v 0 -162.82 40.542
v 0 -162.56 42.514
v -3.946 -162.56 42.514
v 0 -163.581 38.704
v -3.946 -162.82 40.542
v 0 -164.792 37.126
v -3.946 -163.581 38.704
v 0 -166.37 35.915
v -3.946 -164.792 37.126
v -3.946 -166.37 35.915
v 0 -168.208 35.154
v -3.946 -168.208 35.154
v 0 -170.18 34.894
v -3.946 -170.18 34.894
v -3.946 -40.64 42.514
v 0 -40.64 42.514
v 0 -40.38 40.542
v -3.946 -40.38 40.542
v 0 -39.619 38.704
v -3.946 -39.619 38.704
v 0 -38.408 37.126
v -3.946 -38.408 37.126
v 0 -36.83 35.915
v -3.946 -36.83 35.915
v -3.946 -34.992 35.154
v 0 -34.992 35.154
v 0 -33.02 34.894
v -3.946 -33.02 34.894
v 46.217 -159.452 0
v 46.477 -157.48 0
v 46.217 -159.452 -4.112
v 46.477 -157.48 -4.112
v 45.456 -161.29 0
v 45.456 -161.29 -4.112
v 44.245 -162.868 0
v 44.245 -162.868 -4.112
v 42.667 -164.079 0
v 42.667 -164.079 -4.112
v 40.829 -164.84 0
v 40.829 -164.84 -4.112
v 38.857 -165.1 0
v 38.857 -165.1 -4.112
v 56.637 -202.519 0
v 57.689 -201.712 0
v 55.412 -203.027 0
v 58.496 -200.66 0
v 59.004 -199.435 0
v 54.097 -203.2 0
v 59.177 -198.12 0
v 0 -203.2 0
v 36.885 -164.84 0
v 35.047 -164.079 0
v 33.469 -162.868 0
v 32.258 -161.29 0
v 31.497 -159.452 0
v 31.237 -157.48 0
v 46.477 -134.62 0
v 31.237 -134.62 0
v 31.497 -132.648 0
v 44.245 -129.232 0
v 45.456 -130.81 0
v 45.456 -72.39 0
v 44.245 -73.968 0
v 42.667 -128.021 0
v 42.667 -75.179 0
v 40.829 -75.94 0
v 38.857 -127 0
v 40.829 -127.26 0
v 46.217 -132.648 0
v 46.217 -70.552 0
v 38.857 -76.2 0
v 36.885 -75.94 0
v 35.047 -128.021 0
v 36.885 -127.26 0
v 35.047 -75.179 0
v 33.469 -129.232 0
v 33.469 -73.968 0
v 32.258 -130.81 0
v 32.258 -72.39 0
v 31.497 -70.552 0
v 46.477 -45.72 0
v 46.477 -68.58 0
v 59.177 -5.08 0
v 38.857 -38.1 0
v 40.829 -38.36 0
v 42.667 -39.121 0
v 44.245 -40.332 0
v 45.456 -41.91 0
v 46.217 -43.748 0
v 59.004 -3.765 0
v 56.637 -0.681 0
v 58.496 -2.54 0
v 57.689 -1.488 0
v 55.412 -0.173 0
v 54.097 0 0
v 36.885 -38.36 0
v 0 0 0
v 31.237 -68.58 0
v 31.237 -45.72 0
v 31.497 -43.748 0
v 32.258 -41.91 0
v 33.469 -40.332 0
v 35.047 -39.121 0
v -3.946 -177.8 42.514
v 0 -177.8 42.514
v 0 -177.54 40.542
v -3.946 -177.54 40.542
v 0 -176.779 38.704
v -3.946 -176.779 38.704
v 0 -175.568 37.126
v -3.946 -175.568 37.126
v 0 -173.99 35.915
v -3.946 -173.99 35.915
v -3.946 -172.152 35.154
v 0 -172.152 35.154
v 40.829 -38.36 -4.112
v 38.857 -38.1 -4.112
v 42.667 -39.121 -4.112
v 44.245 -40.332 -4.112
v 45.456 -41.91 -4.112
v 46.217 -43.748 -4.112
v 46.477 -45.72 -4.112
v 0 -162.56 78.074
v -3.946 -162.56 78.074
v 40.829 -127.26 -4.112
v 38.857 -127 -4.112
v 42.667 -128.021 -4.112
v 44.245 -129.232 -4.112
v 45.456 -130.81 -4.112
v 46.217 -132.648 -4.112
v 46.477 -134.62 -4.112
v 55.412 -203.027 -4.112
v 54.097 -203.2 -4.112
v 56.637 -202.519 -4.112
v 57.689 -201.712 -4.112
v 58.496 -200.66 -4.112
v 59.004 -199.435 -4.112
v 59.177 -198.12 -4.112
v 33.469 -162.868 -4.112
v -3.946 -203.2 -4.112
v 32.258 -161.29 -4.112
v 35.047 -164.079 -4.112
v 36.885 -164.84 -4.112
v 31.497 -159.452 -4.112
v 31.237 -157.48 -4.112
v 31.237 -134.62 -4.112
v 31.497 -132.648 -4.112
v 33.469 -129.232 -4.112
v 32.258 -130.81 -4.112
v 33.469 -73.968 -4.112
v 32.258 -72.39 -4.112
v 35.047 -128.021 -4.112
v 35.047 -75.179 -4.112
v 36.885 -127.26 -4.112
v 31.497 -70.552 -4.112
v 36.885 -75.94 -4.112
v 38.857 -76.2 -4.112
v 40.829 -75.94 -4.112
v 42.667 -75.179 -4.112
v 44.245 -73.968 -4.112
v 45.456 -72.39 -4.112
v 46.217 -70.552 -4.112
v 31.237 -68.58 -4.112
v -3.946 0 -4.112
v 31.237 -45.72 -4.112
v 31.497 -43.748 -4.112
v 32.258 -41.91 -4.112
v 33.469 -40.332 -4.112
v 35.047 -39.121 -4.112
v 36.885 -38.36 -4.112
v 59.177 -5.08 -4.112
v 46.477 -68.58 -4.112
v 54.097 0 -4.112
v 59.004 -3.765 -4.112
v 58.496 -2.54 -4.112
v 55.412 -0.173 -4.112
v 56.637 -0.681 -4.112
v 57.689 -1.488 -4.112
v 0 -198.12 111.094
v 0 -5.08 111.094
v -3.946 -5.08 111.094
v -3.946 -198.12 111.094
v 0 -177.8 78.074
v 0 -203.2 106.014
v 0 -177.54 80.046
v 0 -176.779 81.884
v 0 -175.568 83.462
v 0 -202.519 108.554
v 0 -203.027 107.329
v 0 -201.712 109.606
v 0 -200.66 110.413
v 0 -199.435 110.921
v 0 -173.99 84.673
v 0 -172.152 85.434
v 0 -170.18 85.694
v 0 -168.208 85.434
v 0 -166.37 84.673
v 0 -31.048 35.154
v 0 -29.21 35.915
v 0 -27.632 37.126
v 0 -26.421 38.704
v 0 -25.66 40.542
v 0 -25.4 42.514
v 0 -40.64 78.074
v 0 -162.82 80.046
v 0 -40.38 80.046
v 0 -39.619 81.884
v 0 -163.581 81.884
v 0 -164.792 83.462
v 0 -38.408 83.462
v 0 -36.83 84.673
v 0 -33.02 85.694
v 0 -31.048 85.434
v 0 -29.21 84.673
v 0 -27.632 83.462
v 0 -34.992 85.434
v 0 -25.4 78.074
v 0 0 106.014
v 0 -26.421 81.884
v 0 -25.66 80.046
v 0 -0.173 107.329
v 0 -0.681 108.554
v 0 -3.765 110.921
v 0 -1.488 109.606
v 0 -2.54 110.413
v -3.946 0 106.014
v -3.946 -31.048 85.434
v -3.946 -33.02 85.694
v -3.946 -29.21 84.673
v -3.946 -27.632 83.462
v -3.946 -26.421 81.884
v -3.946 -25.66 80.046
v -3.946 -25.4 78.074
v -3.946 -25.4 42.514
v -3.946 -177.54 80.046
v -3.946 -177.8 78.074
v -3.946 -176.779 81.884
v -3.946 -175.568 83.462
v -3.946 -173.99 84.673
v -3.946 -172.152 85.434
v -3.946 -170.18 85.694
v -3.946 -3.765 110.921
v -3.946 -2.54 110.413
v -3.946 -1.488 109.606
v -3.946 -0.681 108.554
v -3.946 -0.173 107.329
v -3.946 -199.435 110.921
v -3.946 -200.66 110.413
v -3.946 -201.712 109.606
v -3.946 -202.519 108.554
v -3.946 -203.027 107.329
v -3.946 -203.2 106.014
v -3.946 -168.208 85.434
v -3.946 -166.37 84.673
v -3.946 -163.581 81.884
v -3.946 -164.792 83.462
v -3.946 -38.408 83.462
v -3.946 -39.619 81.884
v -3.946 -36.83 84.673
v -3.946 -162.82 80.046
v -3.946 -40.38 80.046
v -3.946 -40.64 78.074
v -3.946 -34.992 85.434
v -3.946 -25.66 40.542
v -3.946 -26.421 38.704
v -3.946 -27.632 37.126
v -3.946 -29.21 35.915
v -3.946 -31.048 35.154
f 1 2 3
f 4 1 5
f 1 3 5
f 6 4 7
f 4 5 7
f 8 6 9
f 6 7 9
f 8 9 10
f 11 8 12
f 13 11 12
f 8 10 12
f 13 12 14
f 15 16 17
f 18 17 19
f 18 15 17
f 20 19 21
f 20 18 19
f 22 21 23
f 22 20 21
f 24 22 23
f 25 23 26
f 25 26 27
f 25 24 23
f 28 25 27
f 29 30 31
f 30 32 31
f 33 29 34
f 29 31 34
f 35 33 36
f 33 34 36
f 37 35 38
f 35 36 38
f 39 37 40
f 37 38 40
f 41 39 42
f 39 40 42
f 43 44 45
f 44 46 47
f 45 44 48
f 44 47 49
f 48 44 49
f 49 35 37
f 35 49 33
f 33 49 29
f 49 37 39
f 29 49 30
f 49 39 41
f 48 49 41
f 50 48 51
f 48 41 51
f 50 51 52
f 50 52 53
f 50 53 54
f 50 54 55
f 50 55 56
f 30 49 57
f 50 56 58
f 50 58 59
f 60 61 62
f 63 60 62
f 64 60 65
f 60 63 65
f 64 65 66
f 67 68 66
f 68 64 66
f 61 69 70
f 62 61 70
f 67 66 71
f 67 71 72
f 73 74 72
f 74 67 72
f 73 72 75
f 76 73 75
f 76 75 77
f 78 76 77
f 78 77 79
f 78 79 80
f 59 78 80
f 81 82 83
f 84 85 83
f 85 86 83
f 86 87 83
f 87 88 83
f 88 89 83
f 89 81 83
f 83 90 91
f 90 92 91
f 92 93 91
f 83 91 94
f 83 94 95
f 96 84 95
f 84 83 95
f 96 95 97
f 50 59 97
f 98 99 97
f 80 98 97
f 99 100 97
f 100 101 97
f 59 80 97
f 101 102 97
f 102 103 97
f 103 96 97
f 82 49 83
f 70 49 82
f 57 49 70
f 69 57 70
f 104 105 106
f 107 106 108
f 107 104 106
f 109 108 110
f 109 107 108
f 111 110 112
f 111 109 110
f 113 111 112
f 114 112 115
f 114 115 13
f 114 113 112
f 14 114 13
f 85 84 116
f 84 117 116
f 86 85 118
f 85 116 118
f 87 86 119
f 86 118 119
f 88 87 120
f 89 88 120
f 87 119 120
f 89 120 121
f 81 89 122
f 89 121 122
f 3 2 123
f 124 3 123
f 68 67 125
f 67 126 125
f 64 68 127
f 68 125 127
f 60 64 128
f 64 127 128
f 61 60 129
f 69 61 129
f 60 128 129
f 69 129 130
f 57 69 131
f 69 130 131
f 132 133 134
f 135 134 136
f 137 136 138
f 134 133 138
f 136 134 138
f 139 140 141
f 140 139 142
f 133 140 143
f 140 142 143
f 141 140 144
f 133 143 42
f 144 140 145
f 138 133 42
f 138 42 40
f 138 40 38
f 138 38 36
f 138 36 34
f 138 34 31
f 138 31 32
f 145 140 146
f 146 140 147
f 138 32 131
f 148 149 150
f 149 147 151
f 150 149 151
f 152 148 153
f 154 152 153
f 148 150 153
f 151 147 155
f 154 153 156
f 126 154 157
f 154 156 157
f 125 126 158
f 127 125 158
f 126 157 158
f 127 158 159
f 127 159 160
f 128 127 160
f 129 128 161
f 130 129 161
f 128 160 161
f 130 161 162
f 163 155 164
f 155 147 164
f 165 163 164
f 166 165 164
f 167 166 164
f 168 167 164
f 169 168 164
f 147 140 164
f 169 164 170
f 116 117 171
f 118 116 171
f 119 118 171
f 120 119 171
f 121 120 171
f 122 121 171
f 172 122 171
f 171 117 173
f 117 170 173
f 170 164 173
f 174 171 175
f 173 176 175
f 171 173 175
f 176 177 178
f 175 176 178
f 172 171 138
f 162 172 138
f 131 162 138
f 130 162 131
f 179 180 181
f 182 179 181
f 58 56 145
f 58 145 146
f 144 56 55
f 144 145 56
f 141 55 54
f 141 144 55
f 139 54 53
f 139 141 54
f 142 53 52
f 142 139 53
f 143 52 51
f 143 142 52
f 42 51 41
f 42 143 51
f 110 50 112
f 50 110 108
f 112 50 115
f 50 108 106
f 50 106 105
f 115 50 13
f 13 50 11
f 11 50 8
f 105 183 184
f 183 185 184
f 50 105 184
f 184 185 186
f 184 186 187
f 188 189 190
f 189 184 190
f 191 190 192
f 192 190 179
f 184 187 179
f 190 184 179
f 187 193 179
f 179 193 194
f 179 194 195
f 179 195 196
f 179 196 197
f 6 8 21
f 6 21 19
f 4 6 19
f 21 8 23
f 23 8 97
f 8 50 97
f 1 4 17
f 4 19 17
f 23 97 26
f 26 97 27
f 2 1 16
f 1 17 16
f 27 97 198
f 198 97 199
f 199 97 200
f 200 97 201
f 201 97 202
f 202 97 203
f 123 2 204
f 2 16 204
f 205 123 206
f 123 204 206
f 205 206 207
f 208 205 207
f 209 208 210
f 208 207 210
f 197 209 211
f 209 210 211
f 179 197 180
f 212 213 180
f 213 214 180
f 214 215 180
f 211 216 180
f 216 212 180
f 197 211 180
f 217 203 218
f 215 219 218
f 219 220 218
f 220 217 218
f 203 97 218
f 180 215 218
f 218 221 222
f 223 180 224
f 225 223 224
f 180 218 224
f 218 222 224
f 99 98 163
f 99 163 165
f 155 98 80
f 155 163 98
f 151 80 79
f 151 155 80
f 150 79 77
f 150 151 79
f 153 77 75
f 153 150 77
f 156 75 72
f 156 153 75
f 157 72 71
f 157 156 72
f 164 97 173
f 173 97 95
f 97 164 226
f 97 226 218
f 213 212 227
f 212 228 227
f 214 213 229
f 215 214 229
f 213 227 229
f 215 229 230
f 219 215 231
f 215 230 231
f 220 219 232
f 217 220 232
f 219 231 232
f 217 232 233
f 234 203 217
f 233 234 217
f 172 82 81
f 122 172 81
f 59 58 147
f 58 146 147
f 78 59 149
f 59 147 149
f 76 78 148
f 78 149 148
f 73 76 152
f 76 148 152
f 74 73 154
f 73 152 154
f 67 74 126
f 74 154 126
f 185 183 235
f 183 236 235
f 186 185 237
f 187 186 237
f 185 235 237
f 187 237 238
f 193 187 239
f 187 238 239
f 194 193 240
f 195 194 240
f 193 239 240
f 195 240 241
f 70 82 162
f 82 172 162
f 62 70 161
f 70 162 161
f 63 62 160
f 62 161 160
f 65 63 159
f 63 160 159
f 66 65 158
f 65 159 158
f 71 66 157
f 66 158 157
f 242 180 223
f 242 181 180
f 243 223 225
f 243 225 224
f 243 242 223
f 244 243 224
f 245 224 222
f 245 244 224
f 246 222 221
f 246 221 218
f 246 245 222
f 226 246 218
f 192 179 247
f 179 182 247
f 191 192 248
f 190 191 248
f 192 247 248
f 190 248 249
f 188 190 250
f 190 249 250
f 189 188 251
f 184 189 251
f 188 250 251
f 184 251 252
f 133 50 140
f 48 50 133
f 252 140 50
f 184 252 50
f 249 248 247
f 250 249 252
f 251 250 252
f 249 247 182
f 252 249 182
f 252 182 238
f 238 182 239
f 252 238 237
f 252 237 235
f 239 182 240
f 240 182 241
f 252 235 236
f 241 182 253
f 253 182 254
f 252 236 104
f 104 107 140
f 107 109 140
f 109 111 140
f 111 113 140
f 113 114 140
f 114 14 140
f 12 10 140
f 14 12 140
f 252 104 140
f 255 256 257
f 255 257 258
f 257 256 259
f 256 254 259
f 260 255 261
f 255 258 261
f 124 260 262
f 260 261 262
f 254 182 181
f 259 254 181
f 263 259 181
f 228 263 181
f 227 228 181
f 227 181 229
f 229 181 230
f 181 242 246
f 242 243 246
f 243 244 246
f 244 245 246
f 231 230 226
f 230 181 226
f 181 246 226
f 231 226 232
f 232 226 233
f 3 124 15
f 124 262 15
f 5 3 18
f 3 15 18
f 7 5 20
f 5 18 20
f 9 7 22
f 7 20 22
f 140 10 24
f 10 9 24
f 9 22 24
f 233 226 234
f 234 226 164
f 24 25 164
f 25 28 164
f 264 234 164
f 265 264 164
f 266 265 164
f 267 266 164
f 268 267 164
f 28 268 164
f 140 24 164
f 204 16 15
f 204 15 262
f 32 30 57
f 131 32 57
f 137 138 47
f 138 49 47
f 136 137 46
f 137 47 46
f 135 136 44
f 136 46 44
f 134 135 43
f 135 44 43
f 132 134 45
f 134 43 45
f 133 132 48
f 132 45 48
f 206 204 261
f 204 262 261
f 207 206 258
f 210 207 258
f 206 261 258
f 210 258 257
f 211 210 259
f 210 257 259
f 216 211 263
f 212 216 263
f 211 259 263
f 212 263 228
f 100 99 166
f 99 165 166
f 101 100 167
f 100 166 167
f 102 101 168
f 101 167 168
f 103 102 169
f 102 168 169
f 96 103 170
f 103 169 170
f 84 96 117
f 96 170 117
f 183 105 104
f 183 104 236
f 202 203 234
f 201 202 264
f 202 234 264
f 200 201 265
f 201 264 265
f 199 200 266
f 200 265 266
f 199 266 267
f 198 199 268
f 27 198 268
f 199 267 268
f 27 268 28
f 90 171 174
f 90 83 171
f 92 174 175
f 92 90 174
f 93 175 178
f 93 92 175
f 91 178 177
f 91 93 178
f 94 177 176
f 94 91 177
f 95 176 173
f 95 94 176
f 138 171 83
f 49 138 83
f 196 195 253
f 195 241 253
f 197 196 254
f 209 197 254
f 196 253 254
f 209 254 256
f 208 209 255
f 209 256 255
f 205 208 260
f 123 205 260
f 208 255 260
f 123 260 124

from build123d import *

# Parameters (mm, degrees)
F1_DEPTH = 203.2
F2_R     = 5.08
F3_W     = 15.24
F3_H     = 50.8
F4_DEPTH = 3.9456780069
F5_R     = 7.61999
F6_W     = 15.24
F6_H     = 38.1
F7_DEPTH = 4.1115754284
F8_R     = 7.61999


# Not quite as in the source:
# - a fillet or chamfer is up to 0.001 mm smaller than in the source, because OpenCascade refuses the exact size


with BuildPart() as f1:
    # F0 (on Front) → F1 (new body)
    with BuildSketch(Plane.XZ):
        Polygon((59.1770336032, 0), (0, 0), (0, 111.0939458013), (-3.9456780069, 111.0939458013), (-3.9456780069, -4.1115754284), (59.1770336032, -4.1115754284), align=None)
    extrude(amount=F1_DEPTH)

    # F2
    f2_edges = [f1.edges().sort_by_distance(p)[0] for p in [
        (-1.972839, -203.2, 111.093946),
        (59.177034, -203.2, -2.055788),
        (59.177034, 0, -2.055788),
        (-1.972839, 0, 111.093946),
    ]]
    fillet(f2_edges, radius=F2_R)

    # F3 (on face) → F4 (cut, through all)
    with BuildSketch(Plane.YZ):
        with Locations((-170.18, 60.2939458013)):
            Rectangle(F3_W, F3_H)
        with Locations((-33.02, 60.2939458013)):
            Rectangle(F3_W, F3_H)
    extrude(amount=-F4_DEPTH, mode=Mode.SUBTRACT)

    # F5 (radius 7.62 in the source; OpenCascade refuses exactly that, so slightly less here)
    f5_edges = [f1.edges().sort_by_distance(p)[0] for p in [
        (-1.972839, -177.8, 34.893946),
        (-1.972839, -162.56, 34.893946),
        (-1.972839, -177.8, 85.693946),
        (-1.972839, -162.56, 85.693946),
        (-1.972839, -40.64, 85.693946),
        (-1.972839, -25.4, 85.693946),
        (-1.972839, -40.64, 34.893946),
        (-1.972839, -25.4, 34.893946),
    ]]
    fillet(f5_edges, radius=F5_R)

    # F6 (on face) → F7 (cut, through all)
    with BuildSketch(Plane.XY):
        with Locations((38.8570336032, -146.05)):
            Rectangle(F6_W, F6_H)
        with Locations((38.8570336032, -57.15)):
            Rectangle(F6_W, F6_H)
    extrude(amount=-F7_DEPTH, mode=Mode.SUBTRACT)

    # F8 (radius 7.62 in the source; OpenCascade refuses exactly that, so slightly less here)
    f8_edges = [f1.edges().sort_by_distance(p)[0] for p in [
        (31.237034, -165.1, -2.055788),
        (46.477034, -165.1, -2.055788),
        (31.237034, -127, -2.055788),
        (46.477034, -127, -2.055788),
        (46.477034, -38.1, -2.055788),
        (46.477034, -76.2, -2.055788),
        (31.237034, -76.2, -2.055788),
        (31.237034, -38.1, -2.055788),
    ]]
    fillet(f8_edges, radius=F8_R)


solid = f1.part
